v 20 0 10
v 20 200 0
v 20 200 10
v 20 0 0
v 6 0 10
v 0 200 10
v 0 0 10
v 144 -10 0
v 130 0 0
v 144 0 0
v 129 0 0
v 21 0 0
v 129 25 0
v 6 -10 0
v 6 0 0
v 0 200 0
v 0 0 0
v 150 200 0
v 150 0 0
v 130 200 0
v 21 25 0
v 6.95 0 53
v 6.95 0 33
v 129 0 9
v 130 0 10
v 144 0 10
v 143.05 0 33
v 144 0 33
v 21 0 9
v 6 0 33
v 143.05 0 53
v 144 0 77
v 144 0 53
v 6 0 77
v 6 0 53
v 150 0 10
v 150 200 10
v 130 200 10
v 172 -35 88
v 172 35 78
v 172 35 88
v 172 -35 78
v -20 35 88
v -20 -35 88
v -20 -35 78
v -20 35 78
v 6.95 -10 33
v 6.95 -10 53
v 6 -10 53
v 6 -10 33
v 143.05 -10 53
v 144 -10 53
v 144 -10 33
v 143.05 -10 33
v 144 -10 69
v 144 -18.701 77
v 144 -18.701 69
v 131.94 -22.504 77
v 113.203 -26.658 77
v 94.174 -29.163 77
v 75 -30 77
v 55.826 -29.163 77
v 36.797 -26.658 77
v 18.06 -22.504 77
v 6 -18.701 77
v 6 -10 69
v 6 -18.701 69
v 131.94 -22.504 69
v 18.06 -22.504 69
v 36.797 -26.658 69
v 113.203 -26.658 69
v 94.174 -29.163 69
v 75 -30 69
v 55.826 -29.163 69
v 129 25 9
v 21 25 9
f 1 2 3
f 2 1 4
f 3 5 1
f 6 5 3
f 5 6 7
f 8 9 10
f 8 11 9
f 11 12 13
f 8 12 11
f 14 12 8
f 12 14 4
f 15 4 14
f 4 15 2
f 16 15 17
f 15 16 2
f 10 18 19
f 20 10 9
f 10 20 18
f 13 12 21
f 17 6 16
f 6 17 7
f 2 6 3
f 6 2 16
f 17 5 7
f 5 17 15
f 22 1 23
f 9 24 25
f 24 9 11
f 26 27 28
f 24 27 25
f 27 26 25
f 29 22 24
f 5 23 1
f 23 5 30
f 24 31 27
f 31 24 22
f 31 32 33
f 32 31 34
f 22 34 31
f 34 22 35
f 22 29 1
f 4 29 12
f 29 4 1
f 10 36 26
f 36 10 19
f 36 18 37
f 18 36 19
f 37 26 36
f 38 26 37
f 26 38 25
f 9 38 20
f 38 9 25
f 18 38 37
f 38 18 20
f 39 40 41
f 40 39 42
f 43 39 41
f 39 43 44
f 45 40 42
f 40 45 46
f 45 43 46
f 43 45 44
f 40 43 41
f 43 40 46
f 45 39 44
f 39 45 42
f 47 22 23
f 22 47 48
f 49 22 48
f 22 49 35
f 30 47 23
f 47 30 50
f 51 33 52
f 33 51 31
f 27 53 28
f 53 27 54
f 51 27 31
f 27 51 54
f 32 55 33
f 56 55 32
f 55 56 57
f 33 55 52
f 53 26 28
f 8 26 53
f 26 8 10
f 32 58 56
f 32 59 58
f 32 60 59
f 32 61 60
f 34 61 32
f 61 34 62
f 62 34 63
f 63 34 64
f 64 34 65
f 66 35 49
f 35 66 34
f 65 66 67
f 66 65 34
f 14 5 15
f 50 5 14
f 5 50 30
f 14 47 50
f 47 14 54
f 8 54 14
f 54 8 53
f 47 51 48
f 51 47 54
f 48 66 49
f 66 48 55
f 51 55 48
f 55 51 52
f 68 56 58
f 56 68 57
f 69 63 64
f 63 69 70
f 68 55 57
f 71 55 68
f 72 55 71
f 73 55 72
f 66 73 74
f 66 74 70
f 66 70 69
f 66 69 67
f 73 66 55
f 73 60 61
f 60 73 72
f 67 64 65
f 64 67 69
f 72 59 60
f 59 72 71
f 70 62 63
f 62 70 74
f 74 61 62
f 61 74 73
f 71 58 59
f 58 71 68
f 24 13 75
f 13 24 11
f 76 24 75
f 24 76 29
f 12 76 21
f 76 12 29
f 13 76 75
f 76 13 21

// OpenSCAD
// The spacing between the two aluminium profiles in mm
MM_BETWEEN_ALUPROFILES = 110;

// Bobbyass™ thickness
MM_THICKNESS = 10;

// The height of the hole
MM_HEIGHT = 78;
// The width of the hole
MM_WIDTH = 140;

// The width of the left alu profile
MM_LEFT_ALU = 20;
// Probably same as left profile
MM_RIGHT_ALU = 20;
// Height of the alu profiles
MM_HEIGHT_ALU = 10;

// How many mm deep the 3d print should go between the alu profiles
MM_DEPTH_BACK = 25; 
// How many mm "deep" the 3d print should go at the top so you can drill a hole and lock it in place
MM_DEPTH_FRONT = 20;
// How high the two things above should be in mm
MM_DEPTH_HEIGHT = 8;

// Spaxgurt™ height
MM_BELT_HEIGHT = 20;

// Circle Radius
CIRCLE_RADIUS = 220; // [50:1:1000]

// Just for visual
GLOBAL_MM_ALU_LENGTH = 200;
// Global clearance between parts
GLOBAL_CLEARANCE = 1; // [0:0.1:5]

// Enable Smoothening
GLOBAL_EN_SMOOTH = false;
GLOBAL_SMOOTH = 2; // [1:2:5]
GLOBAL_SMOOTHNESS = 16; // [2:1:48]

// Toggle better visualization
BETTER_VISUALIZE = true;
// Color of the 3d print
3DPRINT_COLOR = [1,1,1]; //[0:0.1:1]


// Smooth
module smoother(){
    sphere(r=GLOBAL_SMOOTH,$fn=GLOBAL_SMOOTHNESS);
}
module offset_in() {
    difference() {
        //children();
        difference() {
          cube([1000, 1000, 1000], true);
            render() {   
              minkowski() {
                difference() {
                  cube([1000, 1000, 1000], true);
                  children();
                }                                        
                smoother();
              }
            }
          }
      }
}
module smooth(){
    minkowski(){
        offset_in(){children();};
        smoother();
    }
}


module alu(width, height) {
    cube([width, GLOBAL_MM_ALU_LENGTH, height]);
}

module alu_profiles(mm_left, mm_right, mm_height) {
    color("silver") {
        between = mm_left + MM_BETWEEN_ALUPROFILES;
        
        alu(mm_left, mm_height);
        
        translate([between,0,0]) {
            alu(mm_right, mm_height);
        }
    }
}

module top_bobbycar() {
    {
        translate([-20,-35,MM_HEIGHT]) {
            cube([MM_LEFT_ALU+MM_RIGHT_ALU+MM_BETWEEN_ALUPROFILES+GLOBAL_CLEARANCE*2 + 40,70,10]);
        }
    }
}

module show_visual() {
    alu_profiles(MM_LEFT_ALU, MM_RIGHT_ALU, MM_HEIGHT_ALU);
    top_bobbycar();
}

if (BETTER_VISUALIZE) {
    show_visual();
}

module between_alu() {
    translate([MM_LEFT_ALU + GLOBAL_CLEARANCE,0,0]) {
        cube([MM_BETWEEN_ALUPROFILES - 2*GLOBAL_CLEARANCE, MM_DEPTH_BACK, MM_HEIGHT_ALU - GLOBAL_CLEARANCE]);
    }
}

module belt(height, depth, width) {
    translate([0,-1,0]) {
        cube([width,depth+2,height]);
    }
}

module vertical_plate() {
        center = (MM_BETWEEN_ALUPROFILES / 2 + MM_LEFT_ALU);
        width = MM_WIDTH - GLOBAL_CLEARANCE * 2;
        height = MM_HEIGHT - GLOBAL_CLEARANCE;
        offset = center - width / 2;
    
        difference() {
            translate([offset,-MM_THICKNESS,0]) {
                cube([width, MM_THICKNESS, height]);
            }
            
            translate([offset, -MM_THICKNESS, height / 2 - MM_BELT_HEIGHT / 2 + (MM_HEIGHT_ALU - GLOBAL_CLEARANCE) / 2]) {
                belt_width = 1;
                translate([-0.05, 0,0]) {
                    belt(MM_BELT_HEIGHT, MM_THICKNESS, belt_width);
                }
                translate([width-belt_width+0.05,0,0]) {
                    belt(MM_BELT_HEIGHT, MM_THICKNESS, belt_width);
                }
            }
        }
}

module screw_plate() {
    
    center = (MM_BETWEEN_ALUPROFILES / 2 + MM_LEFT_ALU);
    width = MM_WIDTH - GLOBAL_CLEARANCE * 2;
    offset = center - width / 2;
    
    translate([offset,-MM_THICKNESS - MM_DEPTH_FRONT,MM_HEIGHT - GLOBAL_CLEARANCE - MM_DEPTH_HEIGHT]) {
        if (CIRCLE_RADIUS < 1000)
        {
            intersection() {
                translate([width/2, CIRCLE_RADIUS, 0]) {
                    cylinder(h=MM_DEPTH_HEIGHT, r=CIRCLE_RADIUS, $fs=5, $fa=5);
                }
                cube([width,MM_DEPTH_FRONT,MM_DEPTH_HEIGHT]);
            }
        }
        else
        {
            cube([width,MM_DEPTH_FRONT,MM_DEPTH_HEIGHT]);
        }
    }
}

module printable() {
    between_alu();
    vertical_plate();
    screw_plate();
}

// Now render the thing
color(3DPRINT_COLOR) {
    if (GLOBAL_EN_SMOOTH) {
        smooth() printable();
    } else {
        printable();
    }
}
